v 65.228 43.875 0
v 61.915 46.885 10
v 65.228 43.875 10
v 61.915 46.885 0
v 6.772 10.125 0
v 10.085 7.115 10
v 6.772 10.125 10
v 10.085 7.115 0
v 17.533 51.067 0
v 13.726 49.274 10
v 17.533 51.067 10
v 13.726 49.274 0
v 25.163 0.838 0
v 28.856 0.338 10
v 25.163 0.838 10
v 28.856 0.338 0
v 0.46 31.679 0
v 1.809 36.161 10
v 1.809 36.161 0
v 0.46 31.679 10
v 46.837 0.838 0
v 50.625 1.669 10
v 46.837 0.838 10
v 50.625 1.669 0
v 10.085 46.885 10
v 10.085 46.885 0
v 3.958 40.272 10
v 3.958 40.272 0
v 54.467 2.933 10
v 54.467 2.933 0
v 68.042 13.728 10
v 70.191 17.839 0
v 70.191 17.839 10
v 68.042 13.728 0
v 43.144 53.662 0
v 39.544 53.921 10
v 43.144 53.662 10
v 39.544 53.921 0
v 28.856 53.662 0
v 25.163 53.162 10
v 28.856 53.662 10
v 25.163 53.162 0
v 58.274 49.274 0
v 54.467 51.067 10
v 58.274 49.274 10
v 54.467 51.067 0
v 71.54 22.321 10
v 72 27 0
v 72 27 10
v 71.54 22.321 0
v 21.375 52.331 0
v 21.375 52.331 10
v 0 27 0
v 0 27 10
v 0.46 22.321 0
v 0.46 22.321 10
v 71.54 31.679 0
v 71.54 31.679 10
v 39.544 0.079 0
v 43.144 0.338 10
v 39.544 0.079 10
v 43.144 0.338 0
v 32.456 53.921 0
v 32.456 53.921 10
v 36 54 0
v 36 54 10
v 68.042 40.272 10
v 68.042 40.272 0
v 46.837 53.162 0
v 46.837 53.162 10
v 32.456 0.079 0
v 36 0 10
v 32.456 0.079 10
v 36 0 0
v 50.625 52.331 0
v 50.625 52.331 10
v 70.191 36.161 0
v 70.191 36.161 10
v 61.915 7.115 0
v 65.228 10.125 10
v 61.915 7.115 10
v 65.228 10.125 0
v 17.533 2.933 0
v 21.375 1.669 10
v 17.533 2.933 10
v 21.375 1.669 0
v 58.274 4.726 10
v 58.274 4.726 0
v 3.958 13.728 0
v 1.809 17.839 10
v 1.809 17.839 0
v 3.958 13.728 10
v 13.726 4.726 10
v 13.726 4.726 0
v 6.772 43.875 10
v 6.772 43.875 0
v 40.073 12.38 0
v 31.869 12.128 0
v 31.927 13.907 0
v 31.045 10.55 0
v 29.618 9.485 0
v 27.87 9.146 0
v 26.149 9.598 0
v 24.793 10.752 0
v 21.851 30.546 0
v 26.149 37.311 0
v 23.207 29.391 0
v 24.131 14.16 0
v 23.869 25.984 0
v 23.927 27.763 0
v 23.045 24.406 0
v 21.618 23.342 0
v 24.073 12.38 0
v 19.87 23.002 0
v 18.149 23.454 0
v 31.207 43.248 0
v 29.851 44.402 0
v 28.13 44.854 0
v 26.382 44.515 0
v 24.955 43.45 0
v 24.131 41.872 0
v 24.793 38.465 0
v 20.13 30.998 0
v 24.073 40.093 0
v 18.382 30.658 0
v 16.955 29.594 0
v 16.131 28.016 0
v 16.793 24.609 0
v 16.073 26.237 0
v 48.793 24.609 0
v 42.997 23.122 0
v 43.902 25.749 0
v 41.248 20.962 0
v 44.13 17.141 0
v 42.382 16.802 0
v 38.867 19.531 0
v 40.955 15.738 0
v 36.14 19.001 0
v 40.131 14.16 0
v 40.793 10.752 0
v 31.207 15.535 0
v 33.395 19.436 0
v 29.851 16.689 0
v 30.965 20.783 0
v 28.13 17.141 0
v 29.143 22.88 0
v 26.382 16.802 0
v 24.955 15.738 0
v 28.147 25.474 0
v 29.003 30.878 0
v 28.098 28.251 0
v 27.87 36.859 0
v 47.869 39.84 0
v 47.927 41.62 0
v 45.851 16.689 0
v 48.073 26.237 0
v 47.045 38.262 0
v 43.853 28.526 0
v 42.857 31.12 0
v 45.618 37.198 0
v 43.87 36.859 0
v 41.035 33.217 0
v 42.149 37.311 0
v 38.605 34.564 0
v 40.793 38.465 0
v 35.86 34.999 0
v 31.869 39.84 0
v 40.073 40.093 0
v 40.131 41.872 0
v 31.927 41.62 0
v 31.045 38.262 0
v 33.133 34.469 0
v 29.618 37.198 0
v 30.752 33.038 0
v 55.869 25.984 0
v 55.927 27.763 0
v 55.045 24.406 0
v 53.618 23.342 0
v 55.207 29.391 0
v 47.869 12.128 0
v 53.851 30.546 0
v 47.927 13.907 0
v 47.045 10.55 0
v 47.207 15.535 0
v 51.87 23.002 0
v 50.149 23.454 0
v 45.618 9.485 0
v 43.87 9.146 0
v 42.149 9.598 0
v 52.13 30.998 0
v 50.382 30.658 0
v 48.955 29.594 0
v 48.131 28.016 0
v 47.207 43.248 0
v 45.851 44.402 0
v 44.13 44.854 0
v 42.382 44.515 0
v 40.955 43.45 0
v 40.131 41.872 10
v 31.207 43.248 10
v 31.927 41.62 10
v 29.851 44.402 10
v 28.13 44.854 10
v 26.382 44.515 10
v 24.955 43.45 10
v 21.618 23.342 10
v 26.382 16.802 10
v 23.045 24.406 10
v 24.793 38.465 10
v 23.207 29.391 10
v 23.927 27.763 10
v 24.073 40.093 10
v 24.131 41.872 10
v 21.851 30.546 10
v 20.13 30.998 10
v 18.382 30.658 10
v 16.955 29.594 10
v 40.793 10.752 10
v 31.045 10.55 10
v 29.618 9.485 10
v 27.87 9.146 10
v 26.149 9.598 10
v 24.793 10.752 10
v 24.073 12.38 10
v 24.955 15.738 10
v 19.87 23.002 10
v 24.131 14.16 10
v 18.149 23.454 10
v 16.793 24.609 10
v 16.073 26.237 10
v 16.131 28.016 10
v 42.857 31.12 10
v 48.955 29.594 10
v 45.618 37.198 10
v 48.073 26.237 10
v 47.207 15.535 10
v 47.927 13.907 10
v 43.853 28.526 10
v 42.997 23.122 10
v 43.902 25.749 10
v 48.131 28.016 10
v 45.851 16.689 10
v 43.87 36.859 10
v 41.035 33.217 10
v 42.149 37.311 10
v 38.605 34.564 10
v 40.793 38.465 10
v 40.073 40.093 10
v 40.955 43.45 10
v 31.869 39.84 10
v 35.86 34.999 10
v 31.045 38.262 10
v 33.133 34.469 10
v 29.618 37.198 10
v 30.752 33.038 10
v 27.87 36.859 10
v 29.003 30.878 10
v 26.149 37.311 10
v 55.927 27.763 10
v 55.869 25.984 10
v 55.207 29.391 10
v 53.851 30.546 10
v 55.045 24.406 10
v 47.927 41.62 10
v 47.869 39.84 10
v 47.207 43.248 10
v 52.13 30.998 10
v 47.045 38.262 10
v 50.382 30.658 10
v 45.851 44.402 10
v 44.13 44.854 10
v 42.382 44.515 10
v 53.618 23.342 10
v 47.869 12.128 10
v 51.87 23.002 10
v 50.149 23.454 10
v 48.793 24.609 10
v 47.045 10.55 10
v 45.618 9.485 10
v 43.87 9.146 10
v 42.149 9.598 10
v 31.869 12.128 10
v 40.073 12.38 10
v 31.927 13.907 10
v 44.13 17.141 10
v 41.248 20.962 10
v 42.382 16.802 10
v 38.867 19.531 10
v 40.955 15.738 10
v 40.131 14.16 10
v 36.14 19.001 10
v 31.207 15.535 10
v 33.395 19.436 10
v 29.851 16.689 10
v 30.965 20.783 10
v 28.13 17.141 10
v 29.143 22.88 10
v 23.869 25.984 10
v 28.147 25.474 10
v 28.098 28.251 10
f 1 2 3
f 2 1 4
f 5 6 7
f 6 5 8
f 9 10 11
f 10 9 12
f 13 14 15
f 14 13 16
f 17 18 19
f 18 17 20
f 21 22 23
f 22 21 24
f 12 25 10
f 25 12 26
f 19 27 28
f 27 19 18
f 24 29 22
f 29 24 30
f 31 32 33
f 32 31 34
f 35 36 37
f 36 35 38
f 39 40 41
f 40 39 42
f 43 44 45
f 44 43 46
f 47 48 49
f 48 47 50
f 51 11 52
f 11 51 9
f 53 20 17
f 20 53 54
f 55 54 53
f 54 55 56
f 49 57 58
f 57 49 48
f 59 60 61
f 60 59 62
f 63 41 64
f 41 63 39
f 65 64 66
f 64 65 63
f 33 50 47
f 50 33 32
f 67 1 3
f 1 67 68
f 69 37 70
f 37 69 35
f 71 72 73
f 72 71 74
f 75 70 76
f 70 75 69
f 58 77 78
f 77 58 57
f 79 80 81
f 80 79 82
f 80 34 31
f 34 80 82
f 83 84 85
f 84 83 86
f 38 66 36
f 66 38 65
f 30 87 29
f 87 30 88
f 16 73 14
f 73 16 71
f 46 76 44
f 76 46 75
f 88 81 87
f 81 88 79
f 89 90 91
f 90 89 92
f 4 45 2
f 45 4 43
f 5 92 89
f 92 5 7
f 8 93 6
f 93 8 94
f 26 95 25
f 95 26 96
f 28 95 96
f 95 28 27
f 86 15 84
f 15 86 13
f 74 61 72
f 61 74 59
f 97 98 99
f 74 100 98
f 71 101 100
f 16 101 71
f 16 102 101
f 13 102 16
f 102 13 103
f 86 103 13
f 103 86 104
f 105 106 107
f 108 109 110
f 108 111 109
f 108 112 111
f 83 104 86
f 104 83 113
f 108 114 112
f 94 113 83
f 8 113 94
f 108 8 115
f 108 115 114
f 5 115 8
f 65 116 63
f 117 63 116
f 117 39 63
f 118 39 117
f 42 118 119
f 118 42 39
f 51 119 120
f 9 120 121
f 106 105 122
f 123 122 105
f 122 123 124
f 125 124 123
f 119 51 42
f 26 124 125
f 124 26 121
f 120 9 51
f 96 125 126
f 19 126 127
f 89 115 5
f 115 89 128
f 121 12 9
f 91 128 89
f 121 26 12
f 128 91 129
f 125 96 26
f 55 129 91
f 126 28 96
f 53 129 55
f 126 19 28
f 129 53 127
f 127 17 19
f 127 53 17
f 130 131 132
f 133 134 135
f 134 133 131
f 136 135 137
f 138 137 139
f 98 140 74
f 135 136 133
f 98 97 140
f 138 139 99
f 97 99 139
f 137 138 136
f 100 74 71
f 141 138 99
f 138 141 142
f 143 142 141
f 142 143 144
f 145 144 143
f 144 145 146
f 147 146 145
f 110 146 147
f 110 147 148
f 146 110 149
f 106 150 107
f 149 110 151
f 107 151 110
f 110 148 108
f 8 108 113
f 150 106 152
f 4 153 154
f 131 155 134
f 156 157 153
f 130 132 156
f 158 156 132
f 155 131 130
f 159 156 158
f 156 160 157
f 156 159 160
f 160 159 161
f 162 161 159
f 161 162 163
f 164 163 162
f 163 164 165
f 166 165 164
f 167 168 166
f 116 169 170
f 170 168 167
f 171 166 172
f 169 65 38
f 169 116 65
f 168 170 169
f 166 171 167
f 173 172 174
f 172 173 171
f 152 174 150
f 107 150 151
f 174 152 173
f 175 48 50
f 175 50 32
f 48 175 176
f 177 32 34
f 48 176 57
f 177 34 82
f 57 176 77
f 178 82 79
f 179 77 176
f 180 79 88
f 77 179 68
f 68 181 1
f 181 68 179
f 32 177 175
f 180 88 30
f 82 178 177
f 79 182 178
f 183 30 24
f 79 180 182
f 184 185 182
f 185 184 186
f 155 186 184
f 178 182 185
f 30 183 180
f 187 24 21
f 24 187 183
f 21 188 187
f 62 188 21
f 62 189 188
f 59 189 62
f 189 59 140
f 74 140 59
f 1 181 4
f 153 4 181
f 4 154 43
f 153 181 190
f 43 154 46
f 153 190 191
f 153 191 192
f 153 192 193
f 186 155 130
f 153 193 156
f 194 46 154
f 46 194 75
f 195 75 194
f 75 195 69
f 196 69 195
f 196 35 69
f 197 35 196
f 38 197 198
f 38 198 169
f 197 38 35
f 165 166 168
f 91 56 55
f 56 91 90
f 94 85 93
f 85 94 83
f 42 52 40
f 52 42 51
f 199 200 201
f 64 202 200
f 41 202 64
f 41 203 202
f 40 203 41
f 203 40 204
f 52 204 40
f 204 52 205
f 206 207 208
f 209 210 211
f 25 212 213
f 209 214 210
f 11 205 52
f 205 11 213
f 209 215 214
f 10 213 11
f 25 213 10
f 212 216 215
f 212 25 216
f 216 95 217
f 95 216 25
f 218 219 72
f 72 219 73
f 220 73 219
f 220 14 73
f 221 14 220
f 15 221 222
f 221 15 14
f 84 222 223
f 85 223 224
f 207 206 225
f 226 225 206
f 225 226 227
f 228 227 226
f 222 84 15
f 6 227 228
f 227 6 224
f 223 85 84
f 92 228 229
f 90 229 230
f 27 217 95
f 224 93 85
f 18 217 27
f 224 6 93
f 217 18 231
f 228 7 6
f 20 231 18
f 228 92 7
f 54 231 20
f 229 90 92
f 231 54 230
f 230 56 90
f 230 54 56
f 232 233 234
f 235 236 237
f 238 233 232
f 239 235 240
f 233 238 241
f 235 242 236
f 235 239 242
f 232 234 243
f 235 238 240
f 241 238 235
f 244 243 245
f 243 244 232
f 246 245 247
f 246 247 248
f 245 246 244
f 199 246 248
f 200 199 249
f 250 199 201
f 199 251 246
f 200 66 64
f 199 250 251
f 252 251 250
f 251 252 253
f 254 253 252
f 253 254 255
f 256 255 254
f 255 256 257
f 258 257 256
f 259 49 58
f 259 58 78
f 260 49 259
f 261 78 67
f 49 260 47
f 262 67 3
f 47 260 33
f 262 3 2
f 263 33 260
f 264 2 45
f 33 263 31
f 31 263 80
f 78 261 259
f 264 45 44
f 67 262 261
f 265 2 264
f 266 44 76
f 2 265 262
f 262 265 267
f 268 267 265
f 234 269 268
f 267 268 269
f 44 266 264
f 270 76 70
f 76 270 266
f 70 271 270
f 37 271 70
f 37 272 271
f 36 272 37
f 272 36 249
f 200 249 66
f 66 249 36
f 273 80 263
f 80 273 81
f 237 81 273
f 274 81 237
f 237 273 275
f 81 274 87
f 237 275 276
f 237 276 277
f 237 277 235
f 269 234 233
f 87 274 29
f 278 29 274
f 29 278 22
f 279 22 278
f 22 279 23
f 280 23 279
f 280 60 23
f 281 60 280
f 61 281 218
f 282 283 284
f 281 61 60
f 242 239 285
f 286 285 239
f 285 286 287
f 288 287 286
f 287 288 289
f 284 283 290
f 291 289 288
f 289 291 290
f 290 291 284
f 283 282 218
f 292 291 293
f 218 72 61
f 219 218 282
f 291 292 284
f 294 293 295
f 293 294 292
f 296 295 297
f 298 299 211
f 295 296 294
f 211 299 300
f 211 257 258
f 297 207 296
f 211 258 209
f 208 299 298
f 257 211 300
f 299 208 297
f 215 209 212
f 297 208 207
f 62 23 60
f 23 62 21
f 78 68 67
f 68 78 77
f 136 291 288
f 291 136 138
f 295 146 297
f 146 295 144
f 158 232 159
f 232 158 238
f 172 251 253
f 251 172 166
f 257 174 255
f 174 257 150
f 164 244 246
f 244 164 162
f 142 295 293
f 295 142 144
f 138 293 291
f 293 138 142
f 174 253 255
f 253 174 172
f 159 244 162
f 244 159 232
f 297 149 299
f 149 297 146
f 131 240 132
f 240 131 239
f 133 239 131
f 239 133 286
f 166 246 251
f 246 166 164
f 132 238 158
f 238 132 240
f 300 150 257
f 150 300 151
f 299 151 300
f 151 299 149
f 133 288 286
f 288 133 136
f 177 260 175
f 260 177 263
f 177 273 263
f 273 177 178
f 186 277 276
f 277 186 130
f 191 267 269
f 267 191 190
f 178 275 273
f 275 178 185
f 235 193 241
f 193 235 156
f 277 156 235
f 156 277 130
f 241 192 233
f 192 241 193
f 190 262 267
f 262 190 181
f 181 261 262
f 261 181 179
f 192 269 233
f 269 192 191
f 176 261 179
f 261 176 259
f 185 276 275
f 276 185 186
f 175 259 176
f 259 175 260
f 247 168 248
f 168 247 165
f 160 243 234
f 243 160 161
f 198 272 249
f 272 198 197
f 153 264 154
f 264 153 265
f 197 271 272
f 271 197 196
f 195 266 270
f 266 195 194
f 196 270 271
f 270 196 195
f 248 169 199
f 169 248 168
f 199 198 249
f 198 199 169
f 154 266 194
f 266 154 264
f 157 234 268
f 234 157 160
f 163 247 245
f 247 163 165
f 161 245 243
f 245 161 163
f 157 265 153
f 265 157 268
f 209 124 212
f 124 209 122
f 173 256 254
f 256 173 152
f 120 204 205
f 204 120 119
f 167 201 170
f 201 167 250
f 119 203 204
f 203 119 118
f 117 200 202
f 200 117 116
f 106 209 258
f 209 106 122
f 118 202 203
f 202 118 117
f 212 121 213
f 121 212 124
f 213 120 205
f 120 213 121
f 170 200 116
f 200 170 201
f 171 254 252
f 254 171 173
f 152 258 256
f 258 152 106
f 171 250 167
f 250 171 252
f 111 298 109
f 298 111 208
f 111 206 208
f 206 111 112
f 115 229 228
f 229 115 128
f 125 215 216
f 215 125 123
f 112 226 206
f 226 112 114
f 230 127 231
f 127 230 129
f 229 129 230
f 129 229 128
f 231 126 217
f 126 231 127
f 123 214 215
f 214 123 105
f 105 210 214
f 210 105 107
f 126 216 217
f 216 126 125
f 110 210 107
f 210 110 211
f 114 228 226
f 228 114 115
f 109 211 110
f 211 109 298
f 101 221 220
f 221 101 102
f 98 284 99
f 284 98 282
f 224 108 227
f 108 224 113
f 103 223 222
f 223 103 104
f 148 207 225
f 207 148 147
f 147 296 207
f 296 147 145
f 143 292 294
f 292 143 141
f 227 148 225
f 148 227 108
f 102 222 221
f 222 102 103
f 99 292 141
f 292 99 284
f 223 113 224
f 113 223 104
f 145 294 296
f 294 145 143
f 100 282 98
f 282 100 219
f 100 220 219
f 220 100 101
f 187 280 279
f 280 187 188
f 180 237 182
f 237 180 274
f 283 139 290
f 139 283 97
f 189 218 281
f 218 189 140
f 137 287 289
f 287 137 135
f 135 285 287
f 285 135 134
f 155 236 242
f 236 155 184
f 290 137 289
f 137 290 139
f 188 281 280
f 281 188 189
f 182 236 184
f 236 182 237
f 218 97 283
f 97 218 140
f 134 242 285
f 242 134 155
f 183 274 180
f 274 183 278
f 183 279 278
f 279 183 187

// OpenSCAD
$fn = 32;

// ----------------------------------------------------------------------
// Cam plate: double_lobe cam, base R24
// ----------------------------------------------------------------------

// --- parameters (mm) ---
base_r = 24;              // base circle radius
lobe_h = 12;              // cam lobe rise
bore_r = 8;               // shaft bore radius
plate_t = 10;             // plate thickness, Z (extrusion height)
ring_r = 16;              // lightening ring radius
bolt_r = 4;               // lightening hole radius

profile = [[72, 27], [71.54, 31.679], [70.191, 36.161], [68.042, 40.272], [65.228, 43.875], [61.915, 46.885], [58.274, 49.274], [54.467, 51.067], [50.625, 52.331], [46.837, 53.162], [43.144, 53.662], [39.544, 53.921], [36, 54], [32.456, 53.921], [28.856, 53.662], [25.163, 53.162], [21.375, 52.331], [17.533, 51.067], [13.726, 49.274], [10.085, 46.885], [6.772, 43.875], [3.958, 40.272], [1.809, 36.161], [0.46, 31.679], [0, 27], [0.46, 22.321], [1.809, 17.839], [3.958, 13.728], [6.772, 10.125], [10.085, 7.115], [13.726, 4.726], [17.533, 2.933], [21.375, 1.669], [25.163, 0.838], [28.856, 0.338], [32.456, 0.079], [36, 0], [39.544, 0.079], [43.144, 0.338], [46.837, 0.838], [50.625, 1.669], [54.467, 2.933], [58.274, 4.726], [61.915, 7.115], [65.228, 10.125], [68.042, 13.728], [70.191, 17.839], [71.54, 22.321]];  // primary outline, 48 points, counter clockwise
void_1 = [[43.853, 28.526], [42.857, 31.12], [41.035, 33.217], [38.605, 34.564], [35.86, 34.999], [33.133, 34.469], [30.752, 33.038], [29.003, 30.878], [28.098, 28.251], [28.147, 25.474], [29.143, 22.88], [30.965, 20.783], [33.395, 19.436], [36.14, 19.001], [38.867, 19.531], [41.248, 20.962], [42.997, 23.122], [43.902, 25.749]];  // shaft bore, 18 points
void_2 = [[55.927, 27.763], [55.207, 29.391], [53.851, 30.546], [52.13, 30.998], [50.382, 30.658], [48.955, 29.594], [48.131, 28.016], [48.073, 26.237], [48.793, 24.609], [50.149, 23.454], [51.87, 23.002], [53.618, 23.342], [55.045, 24.406], [55.869, 25.984]];  // lightening hole 1, 14 points
void_3 = [[47.927, 41.62], [47.207, 43.248], [45.851, 44.402], [44.13, 44.854], [42.382, 44.515], [40.955, 43.45], [40.131, 41.872], [40.073, 40.093], [40.793, 38.465], [42.149, 37.311], [43.87, 36.859], [45.618, 37.198], [47.045, 38.262], [47.869, 39.84]];  // lightening hole 2, 14 points
void_4 = [[31.927, 41.62], [31.207, 43.248], [29.851, 44.402], [28.13, 44.854], [26.382, 44.515], [24.955, 43.45], [24.131, 41.872], [24.073, 40.093], [24.793, 38.465], [26.149, 37.311], [27.87, 36.859], [29.618, 37.198], [31.045, 38.262], [31.869, 39.84]];  // lightening hole 3, 14 points
void_5 = [[23.927, 27.763], [23.207, 29.391], [21.851, 30.546], [20.13, 30.998], [18.382, 30.658], [16.955, 29.594], [16.131, 28.016], [16.073, 26.237], [16.793, 24.609], [18.149, 23.454], [19.87, 23.002], [21.618, 23.342], [23.045, 24.406], [23.869, 25.984]];  // lightening hole 4, 14 points
void_6 = [[31.927, 13.907], [31.207, 15.535], [29.851, 16.689], [28.13, 17.141], [26.382, 16.802], [24.955, 15.738], [24.131, 14.16], [24.073, 12.38], [24.793, 10.752], [26.149, 9.598], [27.87, 9.146], [29.618, 9.485], [31.045, 10.55], [31.869, 12.128]];  // lightening hole 5, 14 points
void_7 = [[47.927, 13.907], [47.207, 15.535], [45.851, 16.689], [44.13, 17.141], [42.382, 16.802], [40.955, 15.738], [40.131, 14.16], [40.073, 12.38], [40.793, 10.752], [42.149, 9.598], [43.87, 9.146], [45.618, 9.485], [47.045, 10.55], [47.869, 12.128]];  // lightening hole 6, 14 points

// --- the one profile operation ---
difference() {
  linear_extrude(height = plate_t) polygon(points = profile);
  translate([0, 0, -1])
    linear_extrude(height = plate_t + 2) polygon(points = void_1);
  translate([0, 0, -1])
    linear_extrude(height = plate_t + 2) polygon(points = void_2);
  translate([0, 0, -1])
    linear_extrude(height = plate_t + 2) polygon(points = void_3);
  translate([0, 0, -1])
    linear_extrude(height = plate_t + 2) polygon(points = void_4);
  translate([0, 0, -1])
    linear_extrude(height = plate_t + 2) polygon(points = void_5);
  translate([0, 0, -1])
    linear_extrude(height = plate_t + 2) polygon(points = void_6);
  translate([0, 0, -1])
    linear_extrude(height = plate_t + 2) polygon(points = void_7);
}
